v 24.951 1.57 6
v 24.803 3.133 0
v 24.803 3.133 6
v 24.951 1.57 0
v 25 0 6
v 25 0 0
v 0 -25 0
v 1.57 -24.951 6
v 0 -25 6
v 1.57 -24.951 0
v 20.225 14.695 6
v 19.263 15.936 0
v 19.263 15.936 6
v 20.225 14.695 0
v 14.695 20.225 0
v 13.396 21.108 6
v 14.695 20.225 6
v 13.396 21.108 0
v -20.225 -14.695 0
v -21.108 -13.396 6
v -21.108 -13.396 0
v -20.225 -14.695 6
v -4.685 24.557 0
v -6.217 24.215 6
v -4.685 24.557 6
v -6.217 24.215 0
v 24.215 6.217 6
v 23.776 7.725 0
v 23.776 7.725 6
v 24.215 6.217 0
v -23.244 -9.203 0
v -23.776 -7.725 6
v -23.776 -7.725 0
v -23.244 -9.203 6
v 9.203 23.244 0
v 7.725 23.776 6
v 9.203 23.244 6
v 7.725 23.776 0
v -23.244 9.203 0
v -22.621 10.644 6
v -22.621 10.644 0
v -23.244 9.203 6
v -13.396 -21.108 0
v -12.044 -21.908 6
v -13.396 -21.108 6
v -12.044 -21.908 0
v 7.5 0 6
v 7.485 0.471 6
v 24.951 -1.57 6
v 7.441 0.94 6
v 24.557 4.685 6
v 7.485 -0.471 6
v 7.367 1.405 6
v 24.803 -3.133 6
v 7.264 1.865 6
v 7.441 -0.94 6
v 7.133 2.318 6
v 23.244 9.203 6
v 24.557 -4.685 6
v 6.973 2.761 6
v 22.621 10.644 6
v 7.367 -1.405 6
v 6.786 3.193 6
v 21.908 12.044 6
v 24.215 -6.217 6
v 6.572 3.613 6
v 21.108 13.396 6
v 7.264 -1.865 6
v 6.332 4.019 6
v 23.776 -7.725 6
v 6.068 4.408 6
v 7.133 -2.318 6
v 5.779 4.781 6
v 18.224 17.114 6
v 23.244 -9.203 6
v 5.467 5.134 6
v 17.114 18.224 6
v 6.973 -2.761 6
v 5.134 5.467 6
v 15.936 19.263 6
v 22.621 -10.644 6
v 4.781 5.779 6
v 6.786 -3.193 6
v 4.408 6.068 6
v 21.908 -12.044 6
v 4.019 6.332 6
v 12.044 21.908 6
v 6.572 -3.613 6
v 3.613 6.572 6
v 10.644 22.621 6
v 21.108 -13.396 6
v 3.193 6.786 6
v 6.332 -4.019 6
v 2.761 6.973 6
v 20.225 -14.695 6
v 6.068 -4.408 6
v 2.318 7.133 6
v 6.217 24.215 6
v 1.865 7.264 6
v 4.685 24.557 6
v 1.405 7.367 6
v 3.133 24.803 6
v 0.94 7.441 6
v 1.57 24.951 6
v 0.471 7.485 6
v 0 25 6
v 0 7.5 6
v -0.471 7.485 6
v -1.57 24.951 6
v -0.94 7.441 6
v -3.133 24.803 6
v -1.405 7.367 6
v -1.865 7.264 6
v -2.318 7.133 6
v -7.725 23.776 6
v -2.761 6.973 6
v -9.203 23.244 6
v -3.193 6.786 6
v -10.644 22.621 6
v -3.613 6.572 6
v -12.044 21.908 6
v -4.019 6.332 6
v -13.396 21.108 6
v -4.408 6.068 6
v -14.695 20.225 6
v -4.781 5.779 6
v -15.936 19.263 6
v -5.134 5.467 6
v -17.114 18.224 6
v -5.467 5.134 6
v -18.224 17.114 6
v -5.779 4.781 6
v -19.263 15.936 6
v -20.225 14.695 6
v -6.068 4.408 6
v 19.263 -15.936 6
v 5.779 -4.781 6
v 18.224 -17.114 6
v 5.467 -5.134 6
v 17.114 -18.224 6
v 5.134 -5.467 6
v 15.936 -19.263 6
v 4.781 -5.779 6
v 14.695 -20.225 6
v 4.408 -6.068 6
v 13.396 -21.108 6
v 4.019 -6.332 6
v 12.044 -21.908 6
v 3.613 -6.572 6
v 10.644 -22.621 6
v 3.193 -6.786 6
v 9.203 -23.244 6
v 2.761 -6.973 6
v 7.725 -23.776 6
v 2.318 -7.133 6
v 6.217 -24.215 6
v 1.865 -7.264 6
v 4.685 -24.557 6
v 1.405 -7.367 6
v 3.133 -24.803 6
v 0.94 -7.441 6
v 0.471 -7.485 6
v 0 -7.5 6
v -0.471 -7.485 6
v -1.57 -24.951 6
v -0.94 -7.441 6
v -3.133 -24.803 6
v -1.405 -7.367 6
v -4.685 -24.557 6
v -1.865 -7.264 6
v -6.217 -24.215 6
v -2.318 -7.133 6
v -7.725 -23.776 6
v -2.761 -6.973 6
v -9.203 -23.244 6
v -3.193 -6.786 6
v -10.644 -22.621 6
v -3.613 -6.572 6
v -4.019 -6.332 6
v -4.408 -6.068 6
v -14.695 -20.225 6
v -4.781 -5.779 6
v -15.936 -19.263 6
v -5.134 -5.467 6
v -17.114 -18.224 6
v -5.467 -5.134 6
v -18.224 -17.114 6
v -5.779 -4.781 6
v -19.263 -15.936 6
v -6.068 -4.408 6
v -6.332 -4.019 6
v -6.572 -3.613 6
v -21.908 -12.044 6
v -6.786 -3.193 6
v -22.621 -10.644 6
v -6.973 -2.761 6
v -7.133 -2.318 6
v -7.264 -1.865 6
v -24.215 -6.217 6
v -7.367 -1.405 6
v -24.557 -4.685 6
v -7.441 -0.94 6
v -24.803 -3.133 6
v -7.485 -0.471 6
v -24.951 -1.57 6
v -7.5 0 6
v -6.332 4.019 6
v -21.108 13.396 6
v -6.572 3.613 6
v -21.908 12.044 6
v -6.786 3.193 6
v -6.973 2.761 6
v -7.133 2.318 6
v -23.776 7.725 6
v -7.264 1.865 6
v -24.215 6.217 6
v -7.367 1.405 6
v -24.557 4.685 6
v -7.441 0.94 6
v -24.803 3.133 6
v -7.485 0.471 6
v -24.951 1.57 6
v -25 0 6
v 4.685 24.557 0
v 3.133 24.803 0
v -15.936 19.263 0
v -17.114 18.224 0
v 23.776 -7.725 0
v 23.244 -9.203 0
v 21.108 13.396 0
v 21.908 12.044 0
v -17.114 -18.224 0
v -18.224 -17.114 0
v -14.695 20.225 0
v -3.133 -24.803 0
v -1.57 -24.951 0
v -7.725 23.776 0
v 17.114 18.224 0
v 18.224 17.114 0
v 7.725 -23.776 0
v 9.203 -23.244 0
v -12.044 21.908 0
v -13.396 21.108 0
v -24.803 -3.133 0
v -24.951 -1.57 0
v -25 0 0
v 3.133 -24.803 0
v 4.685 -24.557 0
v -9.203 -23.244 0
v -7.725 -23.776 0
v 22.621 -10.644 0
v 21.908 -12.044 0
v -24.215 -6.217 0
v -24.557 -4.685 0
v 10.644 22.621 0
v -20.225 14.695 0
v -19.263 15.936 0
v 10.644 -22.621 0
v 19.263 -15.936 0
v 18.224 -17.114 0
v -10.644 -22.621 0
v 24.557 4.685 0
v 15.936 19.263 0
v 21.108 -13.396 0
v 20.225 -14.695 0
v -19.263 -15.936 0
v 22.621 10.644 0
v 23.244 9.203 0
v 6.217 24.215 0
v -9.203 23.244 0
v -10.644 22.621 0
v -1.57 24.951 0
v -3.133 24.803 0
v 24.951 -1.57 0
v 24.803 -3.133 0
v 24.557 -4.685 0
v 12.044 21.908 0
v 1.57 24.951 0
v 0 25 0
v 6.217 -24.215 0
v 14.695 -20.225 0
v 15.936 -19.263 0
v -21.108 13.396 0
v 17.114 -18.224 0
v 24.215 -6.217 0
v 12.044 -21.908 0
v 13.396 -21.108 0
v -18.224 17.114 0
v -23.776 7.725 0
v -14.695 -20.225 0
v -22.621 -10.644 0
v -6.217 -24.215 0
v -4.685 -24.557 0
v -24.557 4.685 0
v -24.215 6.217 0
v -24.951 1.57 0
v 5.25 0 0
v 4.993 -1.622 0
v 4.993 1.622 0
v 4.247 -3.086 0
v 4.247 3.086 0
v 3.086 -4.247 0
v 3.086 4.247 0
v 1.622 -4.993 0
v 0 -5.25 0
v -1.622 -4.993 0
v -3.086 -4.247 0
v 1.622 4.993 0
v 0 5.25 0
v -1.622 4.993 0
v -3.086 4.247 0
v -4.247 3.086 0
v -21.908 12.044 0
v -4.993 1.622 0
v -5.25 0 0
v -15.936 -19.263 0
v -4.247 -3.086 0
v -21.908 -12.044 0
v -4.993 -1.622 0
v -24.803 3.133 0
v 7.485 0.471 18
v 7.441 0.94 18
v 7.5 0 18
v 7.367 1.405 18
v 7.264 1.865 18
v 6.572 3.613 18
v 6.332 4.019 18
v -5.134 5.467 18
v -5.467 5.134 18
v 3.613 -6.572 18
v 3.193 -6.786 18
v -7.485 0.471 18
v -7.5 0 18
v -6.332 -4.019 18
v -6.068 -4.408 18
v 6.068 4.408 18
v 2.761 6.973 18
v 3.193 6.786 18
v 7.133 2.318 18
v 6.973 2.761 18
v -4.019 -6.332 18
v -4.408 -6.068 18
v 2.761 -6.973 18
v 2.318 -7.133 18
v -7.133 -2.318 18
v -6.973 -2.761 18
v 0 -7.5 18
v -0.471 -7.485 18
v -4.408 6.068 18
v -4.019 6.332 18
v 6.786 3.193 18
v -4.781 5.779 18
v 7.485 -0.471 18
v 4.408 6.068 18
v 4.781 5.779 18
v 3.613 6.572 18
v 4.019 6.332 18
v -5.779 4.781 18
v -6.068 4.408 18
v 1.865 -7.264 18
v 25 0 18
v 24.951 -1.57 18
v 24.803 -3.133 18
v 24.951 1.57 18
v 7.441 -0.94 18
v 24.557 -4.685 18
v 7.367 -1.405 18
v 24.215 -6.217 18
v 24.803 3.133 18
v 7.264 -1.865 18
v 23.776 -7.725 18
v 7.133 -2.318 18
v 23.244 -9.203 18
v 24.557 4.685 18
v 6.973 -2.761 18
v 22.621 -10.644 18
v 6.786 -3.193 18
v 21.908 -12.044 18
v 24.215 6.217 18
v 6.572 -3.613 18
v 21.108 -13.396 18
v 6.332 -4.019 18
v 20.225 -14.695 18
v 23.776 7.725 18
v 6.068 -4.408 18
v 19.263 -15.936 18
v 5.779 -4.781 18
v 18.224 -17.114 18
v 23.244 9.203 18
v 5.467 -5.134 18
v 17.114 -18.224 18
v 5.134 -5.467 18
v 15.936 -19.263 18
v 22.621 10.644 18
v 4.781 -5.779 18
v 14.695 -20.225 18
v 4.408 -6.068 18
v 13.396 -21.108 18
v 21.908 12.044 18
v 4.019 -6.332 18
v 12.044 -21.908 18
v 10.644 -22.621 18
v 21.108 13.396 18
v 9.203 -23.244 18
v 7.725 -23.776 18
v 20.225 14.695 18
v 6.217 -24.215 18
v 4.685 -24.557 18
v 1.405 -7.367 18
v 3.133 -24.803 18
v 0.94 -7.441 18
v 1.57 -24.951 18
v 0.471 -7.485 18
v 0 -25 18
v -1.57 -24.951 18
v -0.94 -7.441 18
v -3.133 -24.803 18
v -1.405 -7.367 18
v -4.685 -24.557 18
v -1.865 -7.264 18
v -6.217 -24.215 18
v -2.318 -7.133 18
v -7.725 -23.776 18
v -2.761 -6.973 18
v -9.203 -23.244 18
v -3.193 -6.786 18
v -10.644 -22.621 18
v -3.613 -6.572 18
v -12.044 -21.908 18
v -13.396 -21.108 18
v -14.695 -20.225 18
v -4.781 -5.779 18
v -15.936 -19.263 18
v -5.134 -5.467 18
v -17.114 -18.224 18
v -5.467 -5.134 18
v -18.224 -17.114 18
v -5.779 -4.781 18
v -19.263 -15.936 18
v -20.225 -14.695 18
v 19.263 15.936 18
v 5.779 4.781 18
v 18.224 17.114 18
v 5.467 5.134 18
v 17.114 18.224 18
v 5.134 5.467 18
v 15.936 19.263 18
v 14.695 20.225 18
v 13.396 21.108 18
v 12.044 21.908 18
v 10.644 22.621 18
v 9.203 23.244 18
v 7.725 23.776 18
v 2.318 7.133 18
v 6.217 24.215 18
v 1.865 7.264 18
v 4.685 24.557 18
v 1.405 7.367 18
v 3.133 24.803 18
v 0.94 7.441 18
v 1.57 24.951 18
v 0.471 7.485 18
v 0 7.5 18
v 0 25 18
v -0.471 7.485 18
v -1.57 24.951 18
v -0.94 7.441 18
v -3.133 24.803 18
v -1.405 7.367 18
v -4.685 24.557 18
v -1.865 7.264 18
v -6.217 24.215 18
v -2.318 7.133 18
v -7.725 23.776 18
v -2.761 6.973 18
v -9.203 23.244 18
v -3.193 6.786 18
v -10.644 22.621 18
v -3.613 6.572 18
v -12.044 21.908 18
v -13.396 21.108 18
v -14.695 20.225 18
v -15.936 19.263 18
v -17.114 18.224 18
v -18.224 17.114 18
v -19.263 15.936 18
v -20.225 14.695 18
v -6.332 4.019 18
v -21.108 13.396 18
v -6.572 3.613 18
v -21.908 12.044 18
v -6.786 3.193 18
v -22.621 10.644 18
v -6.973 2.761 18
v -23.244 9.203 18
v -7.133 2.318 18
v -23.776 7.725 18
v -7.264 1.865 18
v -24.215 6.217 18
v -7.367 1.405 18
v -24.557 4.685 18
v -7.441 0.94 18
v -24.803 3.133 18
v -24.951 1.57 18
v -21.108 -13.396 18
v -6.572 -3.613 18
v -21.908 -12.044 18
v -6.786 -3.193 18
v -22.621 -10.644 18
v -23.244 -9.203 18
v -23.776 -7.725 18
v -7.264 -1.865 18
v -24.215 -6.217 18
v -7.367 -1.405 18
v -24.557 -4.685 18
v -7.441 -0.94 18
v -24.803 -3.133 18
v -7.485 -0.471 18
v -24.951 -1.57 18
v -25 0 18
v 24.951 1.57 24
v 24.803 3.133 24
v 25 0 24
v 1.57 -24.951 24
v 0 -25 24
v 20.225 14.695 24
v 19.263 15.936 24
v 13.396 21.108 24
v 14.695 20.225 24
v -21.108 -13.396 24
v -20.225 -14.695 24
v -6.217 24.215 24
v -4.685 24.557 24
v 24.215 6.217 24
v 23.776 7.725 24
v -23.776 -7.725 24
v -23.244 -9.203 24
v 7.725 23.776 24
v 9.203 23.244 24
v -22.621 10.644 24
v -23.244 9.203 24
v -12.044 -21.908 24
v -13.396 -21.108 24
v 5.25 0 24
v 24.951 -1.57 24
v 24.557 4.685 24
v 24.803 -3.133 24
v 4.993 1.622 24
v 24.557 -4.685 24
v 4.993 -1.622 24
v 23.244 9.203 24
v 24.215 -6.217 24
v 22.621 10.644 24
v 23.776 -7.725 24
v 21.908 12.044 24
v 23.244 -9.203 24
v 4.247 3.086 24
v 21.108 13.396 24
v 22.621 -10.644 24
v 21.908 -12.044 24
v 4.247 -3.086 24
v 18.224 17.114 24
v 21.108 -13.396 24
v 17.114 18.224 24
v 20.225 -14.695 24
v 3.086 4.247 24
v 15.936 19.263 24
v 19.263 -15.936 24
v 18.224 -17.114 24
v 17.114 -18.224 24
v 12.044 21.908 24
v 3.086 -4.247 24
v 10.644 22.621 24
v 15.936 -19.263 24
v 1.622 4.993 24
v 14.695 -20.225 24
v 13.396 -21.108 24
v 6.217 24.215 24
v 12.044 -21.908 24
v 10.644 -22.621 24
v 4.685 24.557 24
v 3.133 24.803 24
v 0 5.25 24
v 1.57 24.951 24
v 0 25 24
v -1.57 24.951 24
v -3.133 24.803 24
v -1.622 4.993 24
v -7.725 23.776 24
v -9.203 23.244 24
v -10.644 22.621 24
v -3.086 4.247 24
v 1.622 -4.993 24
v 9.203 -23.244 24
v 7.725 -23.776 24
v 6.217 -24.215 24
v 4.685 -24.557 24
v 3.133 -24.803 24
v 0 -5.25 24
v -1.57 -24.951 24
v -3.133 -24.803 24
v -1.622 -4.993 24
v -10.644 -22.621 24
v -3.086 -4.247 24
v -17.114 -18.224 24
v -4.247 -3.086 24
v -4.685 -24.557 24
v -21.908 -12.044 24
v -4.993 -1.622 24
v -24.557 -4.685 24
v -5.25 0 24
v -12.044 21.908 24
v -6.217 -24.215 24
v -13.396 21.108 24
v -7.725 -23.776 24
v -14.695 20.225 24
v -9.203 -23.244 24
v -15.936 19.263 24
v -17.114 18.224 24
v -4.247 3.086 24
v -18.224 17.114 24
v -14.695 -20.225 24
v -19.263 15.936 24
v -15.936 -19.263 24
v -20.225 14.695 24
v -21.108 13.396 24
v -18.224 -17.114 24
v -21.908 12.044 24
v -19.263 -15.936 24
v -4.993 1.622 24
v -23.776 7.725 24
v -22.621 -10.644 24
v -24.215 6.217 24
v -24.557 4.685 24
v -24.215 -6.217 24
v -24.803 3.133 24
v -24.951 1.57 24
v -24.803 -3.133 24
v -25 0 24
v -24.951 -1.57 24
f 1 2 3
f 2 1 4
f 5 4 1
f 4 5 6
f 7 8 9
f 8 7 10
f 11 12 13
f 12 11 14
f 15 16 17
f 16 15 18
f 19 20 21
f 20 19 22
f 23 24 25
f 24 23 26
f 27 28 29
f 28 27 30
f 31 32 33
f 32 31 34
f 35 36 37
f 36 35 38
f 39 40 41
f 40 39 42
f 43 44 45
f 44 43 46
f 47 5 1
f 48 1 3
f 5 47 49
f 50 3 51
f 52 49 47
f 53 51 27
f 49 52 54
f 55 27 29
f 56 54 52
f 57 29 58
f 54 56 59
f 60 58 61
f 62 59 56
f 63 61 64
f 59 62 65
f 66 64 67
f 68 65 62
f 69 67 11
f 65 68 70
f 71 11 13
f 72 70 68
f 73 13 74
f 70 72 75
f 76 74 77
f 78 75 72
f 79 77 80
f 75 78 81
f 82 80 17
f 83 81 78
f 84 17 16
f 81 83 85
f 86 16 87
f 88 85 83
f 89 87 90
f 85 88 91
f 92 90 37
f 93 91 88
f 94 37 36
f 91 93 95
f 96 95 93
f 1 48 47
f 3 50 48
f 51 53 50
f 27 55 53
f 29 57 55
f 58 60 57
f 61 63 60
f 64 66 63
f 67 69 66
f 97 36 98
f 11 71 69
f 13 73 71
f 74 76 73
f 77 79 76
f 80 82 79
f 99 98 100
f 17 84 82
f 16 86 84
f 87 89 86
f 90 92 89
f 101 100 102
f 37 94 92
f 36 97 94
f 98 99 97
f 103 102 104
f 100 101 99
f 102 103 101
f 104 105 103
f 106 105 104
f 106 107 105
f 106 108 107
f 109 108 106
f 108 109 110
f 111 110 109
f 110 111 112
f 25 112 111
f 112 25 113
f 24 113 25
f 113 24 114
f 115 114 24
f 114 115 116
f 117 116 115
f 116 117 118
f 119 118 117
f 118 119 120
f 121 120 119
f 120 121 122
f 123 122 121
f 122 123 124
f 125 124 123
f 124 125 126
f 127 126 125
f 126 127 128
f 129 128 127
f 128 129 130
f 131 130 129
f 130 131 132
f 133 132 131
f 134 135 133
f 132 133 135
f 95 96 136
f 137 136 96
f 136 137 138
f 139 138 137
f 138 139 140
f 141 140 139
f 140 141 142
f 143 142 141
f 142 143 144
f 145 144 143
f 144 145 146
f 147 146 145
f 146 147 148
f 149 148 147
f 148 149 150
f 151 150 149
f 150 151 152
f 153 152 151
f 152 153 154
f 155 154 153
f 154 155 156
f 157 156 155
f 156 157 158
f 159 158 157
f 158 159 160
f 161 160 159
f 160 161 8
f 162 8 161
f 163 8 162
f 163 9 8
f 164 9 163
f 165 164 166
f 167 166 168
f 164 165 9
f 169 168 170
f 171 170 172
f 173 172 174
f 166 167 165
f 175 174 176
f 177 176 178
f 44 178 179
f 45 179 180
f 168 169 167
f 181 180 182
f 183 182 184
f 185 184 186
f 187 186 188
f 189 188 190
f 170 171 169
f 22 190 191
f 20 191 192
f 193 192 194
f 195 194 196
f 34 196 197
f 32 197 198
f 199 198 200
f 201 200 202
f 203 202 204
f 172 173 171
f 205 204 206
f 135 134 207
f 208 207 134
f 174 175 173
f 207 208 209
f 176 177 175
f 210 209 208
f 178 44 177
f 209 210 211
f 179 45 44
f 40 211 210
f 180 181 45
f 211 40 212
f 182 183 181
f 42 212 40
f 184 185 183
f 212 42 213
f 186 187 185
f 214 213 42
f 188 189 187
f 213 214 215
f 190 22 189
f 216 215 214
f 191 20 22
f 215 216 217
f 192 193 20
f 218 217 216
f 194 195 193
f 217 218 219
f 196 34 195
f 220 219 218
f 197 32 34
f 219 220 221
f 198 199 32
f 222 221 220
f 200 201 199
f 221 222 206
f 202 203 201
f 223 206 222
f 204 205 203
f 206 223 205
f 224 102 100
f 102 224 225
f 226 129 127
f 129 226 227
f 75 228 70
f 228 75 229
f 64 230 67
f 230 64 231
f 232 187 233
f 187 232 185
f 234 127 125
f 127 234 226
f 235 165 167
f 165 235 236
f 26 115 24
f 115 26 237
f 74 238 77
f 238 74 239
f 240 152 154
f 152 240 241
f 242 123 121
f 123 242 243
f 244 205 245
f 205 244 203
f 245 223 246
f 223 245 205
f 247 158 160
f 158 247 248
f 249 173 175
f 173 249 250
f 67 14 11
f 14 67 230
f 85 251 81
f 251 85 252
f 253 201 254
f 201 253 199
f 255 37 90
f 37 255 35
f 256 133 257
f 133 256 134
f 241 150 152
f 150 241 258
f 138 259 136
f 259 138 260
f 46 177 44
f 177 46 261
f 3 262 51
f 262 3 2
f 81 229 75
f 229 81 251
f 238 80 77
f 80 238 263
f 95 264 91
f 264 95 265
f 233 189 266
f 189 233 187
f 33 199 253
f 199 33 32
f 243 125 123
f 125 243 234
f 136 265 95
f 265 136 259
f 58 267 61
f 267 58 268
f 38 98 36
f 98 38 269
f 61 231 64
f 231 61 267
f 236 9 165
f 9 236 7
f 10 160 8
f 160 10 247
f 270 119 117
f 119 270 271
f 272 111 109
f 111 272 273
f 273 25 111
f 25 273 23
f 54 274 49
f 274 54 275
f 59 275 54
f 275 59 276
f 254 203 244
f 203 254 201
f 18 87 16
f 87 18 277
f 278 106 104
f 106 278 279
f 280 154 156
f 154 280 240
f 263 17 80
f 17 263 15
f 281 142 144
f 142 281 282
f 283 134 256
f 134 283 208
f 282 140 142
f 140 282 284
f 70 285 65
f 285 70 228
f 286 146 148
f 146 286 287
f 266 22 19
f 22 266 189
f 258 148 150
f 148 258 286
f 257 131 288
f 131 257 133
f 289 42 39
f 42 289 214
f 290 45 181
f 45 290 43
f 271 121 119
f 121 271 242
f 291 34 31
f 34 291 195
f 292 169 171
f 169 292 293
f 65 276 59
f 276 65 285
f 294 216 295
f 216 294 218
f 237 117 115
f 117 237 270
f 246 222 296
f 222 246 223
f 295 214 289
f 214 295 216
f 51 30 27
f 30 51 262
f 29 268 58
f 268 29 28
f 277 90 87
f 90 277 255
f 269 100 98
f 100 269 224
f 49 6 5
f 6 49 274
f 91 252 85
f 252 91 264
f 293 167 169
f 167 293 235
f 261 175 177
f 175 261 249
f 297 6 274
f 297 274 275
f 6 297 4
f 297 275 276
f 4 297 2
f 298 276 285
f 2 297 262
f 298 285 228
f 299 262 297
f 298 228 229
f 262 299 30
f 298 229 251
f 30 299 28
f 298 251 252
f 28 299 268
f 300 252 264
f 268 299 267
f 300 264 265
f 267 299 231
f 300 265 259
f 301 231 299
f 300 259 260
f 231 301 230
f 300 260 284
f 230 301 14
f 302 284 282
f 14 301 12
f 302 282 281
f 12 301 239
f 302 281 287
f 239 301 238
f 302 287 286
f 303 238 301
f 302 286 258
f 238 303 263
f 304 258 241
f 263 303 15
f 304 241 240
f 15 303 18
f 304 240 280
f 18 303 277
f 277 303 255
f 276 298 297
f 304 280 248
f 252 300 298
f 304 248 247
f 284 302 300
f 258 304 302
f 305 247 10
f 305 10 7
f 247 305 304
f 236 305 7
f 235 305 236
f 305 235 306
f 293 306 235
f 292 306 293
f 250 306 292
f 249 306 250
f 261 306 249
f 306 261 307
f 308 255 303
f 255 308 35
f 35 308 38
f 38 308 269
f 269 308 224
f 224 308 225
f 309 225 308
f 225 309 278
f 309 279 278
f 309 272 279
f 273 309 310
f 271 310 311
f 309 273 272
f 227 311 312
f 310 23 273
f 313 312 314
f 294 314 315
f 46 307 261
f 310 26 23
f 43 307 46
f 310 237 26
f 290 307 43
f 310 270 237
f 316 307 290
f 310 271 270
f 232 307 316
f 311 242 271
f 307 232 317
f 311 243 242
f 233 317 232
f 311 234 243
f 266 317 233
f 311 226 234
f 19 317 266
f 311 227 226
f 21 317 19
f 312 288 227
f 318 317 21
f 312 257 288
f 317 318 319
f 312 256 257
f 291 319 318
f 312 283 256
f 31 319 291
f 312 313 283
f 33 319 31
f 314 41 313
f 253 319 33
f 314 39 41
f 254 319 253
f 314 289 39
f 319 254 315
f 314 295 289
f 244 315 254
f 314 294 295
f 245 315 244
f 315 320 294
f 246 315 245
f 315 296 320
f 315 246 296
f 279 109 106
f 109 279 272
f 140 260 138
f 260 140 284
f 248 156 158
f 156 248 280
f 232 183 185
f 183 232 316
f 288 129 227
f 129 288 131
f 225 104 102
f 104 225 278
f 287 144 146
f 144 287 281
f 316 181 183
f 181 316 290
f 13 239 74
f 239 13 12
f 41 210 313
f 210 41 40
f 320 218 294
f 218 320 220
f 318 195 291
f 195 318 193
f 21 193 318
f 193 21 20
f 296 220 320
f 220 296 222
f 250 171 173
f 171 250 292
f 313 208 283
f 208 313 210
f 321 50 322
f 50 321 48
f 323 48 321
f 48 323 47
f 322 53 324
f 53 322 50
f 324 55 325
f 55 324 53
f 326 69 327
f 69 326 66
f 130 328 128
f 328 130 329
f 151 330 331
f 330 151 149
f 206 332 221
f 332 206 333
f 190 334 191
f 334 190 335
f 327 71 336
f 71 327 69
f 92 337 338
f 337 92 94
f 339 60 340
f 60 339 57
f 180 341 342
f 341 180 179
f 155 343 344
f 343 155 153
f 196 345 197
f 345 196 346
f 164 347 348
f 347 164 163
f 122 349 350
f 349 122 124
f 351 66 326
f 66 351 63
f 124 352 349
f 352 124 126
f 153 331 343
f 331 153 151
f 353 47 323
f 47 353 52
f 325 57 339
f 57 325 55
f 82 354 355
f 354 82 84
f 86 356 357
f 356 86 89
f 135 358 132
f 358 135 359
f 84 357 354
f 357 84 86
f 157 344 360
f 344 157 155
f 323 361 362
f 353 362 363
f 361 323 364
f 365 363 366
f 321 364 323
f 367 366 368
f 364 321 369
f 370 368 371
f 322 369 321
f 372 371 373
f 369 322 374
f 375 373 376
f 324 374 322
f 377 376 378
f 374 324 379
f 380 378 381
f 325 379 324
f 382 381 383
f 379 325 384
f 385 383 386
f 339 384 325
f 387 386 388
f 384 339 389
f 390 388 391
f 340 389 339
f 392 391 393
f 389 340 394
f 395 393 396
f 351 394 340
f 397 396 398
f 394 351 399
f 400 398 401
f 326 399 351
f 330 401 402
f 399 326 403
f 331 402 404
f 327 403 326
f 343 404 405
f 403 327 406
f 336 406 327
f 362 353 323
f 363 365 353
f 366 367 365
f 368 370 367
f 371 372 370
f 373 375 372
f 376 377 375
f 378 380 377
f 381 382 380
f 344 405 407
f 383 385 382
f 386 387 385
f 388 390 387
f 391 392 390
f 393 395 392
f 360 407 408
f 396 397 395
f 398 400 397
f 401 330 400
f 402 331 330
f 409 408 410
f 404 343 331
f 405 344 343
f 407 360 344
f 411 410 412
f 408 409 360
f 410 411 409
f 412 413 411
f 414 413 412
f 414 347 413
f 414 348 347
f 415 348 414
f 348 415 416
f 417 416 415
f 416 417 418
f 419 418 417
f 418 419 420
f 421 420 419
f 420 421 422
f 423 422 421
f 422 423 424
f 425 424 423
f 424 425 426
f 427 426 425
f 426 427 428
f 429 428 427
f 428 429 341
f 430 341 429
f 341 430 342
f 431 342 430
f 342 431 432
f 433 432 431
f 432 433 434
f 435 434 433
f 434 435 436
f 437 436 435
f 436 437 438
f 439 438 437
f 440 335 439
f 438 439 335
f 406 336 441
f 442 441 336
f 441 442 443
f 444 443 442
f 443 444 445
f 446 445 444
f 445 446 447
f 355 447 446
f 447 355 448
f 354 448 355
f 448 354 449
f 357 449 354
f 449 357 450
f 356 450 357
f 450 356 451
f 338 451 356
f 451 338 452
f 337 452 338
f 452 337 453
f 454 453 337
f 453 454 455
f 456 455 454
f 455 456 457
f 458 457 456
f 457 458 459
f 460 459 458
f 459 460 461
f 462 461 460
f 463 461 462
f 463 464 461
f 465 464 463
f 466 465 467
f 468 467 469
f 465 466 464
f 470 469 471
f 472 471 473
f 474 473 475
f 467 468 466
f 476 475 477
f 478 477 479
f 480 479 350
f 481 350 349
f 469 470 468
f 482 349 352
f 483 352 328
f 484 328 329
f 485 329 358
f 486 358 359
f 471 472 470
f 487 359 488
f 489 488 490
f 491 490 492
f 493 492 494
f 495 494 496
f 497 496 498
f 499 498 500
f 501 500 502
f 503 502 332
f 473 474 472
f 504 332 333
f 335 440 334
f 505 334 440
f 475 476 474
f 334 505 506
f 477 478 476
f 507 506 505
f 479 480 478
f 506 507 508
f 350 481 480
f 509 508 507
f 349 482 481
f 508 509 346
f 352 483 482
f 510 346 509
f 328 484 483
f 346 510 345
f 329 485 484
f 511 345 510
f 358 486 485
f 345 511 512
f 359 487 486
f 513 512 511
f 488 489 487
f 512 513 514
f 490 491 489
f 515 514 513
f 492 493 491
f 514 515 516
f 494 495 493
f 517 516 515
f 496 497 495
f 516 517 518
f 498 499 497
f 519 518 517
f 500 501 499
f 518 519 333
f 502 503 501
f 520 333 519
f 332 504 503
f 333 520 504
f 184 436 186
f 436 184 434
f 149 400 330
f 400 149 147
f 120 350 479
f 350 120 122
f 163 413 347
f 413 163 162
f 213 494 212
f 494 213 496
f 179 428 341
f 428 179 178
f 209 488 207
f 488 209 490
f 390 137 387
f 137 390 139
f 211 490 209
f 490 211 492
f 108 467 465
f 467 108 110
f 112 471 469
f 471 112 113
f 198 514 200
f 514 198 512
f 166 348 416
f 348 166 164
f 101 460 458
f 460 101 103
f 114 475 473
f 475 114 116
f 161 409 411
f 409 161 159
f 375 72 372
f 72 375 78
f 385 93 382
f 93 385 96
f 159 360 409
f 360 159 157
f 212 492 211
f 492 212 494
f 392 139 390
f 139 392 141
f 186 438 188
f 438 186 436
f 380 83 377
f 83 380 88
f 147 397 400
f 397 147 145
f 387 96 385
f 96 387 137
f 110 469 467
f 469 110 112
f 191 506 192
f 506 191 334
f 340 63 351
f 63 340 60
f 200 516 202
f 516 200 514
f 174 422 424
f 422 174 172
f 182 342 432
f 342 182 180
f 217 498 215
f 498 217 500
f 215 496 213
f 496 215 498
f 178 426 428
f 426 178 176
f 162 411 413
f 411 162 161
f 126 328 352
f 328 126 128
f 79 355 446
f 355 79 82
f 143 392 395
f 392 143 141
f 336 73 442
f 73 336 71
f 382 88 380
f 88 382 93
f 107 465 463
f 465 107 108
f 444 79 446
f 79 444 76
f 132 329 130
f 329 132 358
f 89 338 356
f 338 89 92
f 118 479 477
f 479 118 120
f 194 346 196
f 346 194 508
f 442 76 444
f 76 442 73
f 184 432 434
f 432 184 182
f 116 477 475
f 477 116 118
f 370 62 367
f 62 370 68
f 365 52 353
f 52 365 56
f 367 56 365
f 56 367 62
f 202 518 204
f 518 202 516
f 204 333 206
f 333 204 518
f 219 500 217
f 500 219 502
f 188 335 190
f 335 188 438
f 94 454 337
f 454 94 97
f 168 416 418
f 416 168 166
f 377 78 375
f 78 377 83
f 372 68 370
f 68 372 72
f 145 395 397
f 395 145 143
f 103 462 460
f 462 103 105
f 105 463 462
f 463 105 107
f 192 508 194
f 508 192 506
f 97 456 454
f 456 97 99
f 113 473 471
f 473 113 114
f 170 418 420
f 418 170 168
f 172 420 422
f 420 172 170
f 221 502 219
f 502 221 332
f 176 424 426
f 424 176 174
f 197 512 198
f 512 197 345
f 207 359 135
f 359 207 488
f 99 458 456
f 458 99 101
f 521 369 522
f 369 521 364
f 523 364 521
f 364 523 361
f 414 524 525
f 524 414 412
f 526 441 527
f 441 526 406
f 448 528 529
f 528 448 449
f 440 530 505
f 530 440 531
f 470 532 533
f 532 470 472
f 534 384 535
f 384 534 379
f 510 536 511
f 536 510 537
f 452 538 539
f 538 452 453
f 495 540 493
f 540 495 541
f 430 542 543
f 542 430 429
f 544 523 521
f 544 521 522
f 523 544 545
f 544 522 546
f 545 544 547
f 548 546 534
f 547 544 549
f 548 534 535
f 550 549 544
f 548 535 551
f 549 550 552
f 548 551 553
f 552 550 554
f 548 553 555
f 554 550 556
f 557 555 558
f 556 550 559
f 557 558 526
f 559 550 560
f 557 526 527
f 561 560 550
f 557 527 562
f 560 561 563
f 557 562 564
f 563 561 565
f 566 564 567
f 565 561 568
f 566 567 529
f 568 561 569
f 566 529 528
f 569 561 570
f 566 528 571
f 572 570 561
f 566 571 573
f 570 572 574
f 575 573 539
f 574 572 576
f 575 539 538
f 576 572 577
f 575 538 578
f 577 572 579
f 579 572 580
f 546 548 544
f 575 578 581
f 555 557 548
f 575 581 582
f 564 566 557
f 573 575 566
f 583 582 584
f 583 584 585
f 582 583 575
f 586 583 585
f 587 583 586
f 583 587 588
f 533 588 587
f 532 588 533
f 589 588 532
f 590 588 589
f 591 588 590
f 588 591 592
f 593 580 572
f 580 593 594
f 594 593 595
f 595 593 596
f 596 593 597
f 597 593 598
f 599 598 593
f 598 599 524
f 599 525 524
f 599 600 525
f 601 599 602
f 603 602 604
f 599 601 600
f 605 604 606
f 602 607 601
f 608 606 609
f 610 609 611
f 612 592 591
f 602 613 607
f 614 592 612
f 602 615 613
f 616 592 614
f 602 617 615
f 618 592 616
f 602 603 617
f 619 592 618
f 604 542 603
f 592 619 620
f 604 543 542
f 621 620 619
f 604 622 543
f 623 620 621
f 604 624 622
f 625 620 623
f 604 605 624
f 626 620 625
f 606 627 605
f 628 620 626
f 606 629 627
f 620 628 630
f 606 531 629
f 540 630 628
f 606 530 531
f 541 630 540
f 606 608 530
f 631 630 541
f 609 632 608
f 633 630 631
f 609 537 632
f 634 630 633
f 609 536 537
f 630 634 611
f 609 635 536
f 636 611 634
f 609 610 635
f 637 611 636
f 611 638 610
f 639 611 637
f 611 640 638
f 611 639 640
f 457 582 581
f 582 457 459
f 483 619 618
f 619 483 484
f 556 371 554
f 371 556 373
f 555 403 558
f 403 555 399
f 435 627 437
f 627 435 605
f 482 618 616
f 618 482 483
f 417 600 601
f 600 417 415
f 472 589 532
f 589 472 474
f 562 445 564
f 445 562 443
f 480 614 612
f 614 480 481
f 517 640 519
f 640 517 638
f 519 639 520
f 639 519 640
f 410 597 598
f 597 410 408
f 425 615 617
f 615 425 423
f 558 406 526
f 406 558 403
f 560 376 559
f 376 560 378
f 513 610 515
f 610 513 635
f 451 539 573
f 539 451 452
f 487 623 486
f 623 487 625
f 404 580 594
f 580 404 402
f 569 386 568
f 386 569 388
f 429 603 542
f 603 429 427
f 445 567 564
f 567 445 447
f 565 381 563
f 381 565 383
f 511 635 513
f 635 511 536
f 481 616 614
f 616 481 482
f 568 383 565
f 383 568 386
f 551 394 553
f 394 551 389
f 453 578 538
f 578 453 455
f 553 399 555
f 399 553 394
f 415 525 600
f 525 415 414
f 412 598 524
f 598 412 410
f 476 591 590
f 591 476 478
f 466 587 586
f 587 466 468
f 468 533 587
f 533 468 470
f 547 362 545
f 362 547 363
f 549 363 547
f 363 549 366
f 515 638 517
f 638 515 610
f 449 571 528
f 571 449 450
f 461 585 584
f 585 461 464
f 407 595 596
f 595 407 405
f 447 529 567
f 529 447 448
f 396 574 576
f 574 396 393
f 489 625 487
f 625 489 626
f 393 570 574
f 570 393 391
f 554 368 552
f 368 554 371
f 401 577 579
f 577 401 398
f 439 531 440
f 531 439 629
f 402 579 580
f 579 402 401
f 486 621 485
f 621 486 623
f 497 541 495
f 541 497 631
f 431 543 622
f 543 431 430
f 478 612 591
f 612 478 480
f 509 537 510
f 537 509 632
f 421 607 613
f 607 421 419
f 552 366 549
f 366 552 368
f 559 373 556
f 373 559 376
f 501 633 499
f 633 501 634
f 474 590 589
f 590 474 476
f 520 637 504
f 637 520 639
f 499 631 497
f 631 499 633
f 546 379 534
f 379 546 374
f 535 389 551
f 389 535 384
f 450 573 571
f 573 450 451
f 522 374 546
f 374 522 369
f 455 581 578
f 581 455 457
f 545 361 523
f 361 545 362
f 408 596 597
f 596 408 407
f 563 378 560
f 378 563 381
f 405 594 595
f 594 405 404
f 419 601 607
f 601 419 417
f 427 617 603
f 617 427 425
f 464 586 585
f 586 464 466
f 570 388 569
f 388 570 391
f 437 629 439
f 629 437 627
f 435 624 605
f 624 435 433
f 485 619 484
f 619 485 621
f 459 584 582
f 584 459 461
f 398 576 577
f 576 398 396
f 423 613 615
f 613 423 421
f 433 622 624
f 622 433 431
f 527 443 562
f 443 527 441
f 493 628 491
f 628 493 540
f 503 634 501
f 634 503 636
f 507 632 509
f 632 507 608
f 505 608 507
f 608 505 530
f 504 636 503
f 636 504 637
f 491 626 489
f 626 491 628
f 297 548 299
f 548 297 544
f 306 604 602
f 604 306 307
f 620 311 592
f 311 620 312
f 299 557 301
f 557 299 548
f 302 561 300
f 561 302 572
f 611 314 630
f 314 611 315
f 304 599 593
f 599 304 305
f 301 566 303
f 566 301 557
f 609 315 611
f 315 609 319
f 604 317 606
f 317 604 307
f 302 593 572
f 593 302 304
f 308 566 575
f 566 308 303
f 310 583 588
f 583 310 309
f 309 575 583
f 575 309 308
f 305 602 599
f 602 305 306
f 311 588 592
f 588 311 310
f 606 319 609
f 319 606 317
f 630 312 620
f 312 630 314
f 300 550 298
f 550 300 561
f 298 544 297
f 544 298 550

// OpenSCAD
//RUEDA con radios 
//parametros rueda

//medidas del aro externo de la rueda.
diametro=50; //diametro externo de la rueda. influye en la velocidad.
grosor=6;	// grosor del aro externo de la rueda

//medidas de los radios
//grosor_radios=8; //grosor o altura de los radios

//medidas del hub central
//diam_eje=4;  //eje central por el que pasa el tornillo de izquierdas



//medidas de los agujeros del hub
metrica_hub=3;

module rueda(gros=grosor, diam=diametro)
{
	difference(){
		
				
				union(){
					cylinder (r=diam/2, h=gros, $fn=100);
					translate([0,0,grosor])
					cylinder (r=15/2, h=gros*2, $fn=100);
					translate([0,0,grosor*3])
					cylinder (r=diam/2, h=gros, $fn=100);
				}
				cylinder (r=10.5/2, h=100, $fn=20, center=true);
				//translate([8,0,0])
				//cylinder (r=3.5/2, h=100, $fn=20, center=true);
				//translate([-8,0,0])
				//cylinder (r=3.5/2, h=100, $fn=20, center=true);
			
	}//fin diference
}




	//rueda en si
	rueda();
	
	//taladros
	//translate([-8,0,0])
	//cylinder(r=metrica_hub/2, h=100, $fn=20,center=true);
	




	
